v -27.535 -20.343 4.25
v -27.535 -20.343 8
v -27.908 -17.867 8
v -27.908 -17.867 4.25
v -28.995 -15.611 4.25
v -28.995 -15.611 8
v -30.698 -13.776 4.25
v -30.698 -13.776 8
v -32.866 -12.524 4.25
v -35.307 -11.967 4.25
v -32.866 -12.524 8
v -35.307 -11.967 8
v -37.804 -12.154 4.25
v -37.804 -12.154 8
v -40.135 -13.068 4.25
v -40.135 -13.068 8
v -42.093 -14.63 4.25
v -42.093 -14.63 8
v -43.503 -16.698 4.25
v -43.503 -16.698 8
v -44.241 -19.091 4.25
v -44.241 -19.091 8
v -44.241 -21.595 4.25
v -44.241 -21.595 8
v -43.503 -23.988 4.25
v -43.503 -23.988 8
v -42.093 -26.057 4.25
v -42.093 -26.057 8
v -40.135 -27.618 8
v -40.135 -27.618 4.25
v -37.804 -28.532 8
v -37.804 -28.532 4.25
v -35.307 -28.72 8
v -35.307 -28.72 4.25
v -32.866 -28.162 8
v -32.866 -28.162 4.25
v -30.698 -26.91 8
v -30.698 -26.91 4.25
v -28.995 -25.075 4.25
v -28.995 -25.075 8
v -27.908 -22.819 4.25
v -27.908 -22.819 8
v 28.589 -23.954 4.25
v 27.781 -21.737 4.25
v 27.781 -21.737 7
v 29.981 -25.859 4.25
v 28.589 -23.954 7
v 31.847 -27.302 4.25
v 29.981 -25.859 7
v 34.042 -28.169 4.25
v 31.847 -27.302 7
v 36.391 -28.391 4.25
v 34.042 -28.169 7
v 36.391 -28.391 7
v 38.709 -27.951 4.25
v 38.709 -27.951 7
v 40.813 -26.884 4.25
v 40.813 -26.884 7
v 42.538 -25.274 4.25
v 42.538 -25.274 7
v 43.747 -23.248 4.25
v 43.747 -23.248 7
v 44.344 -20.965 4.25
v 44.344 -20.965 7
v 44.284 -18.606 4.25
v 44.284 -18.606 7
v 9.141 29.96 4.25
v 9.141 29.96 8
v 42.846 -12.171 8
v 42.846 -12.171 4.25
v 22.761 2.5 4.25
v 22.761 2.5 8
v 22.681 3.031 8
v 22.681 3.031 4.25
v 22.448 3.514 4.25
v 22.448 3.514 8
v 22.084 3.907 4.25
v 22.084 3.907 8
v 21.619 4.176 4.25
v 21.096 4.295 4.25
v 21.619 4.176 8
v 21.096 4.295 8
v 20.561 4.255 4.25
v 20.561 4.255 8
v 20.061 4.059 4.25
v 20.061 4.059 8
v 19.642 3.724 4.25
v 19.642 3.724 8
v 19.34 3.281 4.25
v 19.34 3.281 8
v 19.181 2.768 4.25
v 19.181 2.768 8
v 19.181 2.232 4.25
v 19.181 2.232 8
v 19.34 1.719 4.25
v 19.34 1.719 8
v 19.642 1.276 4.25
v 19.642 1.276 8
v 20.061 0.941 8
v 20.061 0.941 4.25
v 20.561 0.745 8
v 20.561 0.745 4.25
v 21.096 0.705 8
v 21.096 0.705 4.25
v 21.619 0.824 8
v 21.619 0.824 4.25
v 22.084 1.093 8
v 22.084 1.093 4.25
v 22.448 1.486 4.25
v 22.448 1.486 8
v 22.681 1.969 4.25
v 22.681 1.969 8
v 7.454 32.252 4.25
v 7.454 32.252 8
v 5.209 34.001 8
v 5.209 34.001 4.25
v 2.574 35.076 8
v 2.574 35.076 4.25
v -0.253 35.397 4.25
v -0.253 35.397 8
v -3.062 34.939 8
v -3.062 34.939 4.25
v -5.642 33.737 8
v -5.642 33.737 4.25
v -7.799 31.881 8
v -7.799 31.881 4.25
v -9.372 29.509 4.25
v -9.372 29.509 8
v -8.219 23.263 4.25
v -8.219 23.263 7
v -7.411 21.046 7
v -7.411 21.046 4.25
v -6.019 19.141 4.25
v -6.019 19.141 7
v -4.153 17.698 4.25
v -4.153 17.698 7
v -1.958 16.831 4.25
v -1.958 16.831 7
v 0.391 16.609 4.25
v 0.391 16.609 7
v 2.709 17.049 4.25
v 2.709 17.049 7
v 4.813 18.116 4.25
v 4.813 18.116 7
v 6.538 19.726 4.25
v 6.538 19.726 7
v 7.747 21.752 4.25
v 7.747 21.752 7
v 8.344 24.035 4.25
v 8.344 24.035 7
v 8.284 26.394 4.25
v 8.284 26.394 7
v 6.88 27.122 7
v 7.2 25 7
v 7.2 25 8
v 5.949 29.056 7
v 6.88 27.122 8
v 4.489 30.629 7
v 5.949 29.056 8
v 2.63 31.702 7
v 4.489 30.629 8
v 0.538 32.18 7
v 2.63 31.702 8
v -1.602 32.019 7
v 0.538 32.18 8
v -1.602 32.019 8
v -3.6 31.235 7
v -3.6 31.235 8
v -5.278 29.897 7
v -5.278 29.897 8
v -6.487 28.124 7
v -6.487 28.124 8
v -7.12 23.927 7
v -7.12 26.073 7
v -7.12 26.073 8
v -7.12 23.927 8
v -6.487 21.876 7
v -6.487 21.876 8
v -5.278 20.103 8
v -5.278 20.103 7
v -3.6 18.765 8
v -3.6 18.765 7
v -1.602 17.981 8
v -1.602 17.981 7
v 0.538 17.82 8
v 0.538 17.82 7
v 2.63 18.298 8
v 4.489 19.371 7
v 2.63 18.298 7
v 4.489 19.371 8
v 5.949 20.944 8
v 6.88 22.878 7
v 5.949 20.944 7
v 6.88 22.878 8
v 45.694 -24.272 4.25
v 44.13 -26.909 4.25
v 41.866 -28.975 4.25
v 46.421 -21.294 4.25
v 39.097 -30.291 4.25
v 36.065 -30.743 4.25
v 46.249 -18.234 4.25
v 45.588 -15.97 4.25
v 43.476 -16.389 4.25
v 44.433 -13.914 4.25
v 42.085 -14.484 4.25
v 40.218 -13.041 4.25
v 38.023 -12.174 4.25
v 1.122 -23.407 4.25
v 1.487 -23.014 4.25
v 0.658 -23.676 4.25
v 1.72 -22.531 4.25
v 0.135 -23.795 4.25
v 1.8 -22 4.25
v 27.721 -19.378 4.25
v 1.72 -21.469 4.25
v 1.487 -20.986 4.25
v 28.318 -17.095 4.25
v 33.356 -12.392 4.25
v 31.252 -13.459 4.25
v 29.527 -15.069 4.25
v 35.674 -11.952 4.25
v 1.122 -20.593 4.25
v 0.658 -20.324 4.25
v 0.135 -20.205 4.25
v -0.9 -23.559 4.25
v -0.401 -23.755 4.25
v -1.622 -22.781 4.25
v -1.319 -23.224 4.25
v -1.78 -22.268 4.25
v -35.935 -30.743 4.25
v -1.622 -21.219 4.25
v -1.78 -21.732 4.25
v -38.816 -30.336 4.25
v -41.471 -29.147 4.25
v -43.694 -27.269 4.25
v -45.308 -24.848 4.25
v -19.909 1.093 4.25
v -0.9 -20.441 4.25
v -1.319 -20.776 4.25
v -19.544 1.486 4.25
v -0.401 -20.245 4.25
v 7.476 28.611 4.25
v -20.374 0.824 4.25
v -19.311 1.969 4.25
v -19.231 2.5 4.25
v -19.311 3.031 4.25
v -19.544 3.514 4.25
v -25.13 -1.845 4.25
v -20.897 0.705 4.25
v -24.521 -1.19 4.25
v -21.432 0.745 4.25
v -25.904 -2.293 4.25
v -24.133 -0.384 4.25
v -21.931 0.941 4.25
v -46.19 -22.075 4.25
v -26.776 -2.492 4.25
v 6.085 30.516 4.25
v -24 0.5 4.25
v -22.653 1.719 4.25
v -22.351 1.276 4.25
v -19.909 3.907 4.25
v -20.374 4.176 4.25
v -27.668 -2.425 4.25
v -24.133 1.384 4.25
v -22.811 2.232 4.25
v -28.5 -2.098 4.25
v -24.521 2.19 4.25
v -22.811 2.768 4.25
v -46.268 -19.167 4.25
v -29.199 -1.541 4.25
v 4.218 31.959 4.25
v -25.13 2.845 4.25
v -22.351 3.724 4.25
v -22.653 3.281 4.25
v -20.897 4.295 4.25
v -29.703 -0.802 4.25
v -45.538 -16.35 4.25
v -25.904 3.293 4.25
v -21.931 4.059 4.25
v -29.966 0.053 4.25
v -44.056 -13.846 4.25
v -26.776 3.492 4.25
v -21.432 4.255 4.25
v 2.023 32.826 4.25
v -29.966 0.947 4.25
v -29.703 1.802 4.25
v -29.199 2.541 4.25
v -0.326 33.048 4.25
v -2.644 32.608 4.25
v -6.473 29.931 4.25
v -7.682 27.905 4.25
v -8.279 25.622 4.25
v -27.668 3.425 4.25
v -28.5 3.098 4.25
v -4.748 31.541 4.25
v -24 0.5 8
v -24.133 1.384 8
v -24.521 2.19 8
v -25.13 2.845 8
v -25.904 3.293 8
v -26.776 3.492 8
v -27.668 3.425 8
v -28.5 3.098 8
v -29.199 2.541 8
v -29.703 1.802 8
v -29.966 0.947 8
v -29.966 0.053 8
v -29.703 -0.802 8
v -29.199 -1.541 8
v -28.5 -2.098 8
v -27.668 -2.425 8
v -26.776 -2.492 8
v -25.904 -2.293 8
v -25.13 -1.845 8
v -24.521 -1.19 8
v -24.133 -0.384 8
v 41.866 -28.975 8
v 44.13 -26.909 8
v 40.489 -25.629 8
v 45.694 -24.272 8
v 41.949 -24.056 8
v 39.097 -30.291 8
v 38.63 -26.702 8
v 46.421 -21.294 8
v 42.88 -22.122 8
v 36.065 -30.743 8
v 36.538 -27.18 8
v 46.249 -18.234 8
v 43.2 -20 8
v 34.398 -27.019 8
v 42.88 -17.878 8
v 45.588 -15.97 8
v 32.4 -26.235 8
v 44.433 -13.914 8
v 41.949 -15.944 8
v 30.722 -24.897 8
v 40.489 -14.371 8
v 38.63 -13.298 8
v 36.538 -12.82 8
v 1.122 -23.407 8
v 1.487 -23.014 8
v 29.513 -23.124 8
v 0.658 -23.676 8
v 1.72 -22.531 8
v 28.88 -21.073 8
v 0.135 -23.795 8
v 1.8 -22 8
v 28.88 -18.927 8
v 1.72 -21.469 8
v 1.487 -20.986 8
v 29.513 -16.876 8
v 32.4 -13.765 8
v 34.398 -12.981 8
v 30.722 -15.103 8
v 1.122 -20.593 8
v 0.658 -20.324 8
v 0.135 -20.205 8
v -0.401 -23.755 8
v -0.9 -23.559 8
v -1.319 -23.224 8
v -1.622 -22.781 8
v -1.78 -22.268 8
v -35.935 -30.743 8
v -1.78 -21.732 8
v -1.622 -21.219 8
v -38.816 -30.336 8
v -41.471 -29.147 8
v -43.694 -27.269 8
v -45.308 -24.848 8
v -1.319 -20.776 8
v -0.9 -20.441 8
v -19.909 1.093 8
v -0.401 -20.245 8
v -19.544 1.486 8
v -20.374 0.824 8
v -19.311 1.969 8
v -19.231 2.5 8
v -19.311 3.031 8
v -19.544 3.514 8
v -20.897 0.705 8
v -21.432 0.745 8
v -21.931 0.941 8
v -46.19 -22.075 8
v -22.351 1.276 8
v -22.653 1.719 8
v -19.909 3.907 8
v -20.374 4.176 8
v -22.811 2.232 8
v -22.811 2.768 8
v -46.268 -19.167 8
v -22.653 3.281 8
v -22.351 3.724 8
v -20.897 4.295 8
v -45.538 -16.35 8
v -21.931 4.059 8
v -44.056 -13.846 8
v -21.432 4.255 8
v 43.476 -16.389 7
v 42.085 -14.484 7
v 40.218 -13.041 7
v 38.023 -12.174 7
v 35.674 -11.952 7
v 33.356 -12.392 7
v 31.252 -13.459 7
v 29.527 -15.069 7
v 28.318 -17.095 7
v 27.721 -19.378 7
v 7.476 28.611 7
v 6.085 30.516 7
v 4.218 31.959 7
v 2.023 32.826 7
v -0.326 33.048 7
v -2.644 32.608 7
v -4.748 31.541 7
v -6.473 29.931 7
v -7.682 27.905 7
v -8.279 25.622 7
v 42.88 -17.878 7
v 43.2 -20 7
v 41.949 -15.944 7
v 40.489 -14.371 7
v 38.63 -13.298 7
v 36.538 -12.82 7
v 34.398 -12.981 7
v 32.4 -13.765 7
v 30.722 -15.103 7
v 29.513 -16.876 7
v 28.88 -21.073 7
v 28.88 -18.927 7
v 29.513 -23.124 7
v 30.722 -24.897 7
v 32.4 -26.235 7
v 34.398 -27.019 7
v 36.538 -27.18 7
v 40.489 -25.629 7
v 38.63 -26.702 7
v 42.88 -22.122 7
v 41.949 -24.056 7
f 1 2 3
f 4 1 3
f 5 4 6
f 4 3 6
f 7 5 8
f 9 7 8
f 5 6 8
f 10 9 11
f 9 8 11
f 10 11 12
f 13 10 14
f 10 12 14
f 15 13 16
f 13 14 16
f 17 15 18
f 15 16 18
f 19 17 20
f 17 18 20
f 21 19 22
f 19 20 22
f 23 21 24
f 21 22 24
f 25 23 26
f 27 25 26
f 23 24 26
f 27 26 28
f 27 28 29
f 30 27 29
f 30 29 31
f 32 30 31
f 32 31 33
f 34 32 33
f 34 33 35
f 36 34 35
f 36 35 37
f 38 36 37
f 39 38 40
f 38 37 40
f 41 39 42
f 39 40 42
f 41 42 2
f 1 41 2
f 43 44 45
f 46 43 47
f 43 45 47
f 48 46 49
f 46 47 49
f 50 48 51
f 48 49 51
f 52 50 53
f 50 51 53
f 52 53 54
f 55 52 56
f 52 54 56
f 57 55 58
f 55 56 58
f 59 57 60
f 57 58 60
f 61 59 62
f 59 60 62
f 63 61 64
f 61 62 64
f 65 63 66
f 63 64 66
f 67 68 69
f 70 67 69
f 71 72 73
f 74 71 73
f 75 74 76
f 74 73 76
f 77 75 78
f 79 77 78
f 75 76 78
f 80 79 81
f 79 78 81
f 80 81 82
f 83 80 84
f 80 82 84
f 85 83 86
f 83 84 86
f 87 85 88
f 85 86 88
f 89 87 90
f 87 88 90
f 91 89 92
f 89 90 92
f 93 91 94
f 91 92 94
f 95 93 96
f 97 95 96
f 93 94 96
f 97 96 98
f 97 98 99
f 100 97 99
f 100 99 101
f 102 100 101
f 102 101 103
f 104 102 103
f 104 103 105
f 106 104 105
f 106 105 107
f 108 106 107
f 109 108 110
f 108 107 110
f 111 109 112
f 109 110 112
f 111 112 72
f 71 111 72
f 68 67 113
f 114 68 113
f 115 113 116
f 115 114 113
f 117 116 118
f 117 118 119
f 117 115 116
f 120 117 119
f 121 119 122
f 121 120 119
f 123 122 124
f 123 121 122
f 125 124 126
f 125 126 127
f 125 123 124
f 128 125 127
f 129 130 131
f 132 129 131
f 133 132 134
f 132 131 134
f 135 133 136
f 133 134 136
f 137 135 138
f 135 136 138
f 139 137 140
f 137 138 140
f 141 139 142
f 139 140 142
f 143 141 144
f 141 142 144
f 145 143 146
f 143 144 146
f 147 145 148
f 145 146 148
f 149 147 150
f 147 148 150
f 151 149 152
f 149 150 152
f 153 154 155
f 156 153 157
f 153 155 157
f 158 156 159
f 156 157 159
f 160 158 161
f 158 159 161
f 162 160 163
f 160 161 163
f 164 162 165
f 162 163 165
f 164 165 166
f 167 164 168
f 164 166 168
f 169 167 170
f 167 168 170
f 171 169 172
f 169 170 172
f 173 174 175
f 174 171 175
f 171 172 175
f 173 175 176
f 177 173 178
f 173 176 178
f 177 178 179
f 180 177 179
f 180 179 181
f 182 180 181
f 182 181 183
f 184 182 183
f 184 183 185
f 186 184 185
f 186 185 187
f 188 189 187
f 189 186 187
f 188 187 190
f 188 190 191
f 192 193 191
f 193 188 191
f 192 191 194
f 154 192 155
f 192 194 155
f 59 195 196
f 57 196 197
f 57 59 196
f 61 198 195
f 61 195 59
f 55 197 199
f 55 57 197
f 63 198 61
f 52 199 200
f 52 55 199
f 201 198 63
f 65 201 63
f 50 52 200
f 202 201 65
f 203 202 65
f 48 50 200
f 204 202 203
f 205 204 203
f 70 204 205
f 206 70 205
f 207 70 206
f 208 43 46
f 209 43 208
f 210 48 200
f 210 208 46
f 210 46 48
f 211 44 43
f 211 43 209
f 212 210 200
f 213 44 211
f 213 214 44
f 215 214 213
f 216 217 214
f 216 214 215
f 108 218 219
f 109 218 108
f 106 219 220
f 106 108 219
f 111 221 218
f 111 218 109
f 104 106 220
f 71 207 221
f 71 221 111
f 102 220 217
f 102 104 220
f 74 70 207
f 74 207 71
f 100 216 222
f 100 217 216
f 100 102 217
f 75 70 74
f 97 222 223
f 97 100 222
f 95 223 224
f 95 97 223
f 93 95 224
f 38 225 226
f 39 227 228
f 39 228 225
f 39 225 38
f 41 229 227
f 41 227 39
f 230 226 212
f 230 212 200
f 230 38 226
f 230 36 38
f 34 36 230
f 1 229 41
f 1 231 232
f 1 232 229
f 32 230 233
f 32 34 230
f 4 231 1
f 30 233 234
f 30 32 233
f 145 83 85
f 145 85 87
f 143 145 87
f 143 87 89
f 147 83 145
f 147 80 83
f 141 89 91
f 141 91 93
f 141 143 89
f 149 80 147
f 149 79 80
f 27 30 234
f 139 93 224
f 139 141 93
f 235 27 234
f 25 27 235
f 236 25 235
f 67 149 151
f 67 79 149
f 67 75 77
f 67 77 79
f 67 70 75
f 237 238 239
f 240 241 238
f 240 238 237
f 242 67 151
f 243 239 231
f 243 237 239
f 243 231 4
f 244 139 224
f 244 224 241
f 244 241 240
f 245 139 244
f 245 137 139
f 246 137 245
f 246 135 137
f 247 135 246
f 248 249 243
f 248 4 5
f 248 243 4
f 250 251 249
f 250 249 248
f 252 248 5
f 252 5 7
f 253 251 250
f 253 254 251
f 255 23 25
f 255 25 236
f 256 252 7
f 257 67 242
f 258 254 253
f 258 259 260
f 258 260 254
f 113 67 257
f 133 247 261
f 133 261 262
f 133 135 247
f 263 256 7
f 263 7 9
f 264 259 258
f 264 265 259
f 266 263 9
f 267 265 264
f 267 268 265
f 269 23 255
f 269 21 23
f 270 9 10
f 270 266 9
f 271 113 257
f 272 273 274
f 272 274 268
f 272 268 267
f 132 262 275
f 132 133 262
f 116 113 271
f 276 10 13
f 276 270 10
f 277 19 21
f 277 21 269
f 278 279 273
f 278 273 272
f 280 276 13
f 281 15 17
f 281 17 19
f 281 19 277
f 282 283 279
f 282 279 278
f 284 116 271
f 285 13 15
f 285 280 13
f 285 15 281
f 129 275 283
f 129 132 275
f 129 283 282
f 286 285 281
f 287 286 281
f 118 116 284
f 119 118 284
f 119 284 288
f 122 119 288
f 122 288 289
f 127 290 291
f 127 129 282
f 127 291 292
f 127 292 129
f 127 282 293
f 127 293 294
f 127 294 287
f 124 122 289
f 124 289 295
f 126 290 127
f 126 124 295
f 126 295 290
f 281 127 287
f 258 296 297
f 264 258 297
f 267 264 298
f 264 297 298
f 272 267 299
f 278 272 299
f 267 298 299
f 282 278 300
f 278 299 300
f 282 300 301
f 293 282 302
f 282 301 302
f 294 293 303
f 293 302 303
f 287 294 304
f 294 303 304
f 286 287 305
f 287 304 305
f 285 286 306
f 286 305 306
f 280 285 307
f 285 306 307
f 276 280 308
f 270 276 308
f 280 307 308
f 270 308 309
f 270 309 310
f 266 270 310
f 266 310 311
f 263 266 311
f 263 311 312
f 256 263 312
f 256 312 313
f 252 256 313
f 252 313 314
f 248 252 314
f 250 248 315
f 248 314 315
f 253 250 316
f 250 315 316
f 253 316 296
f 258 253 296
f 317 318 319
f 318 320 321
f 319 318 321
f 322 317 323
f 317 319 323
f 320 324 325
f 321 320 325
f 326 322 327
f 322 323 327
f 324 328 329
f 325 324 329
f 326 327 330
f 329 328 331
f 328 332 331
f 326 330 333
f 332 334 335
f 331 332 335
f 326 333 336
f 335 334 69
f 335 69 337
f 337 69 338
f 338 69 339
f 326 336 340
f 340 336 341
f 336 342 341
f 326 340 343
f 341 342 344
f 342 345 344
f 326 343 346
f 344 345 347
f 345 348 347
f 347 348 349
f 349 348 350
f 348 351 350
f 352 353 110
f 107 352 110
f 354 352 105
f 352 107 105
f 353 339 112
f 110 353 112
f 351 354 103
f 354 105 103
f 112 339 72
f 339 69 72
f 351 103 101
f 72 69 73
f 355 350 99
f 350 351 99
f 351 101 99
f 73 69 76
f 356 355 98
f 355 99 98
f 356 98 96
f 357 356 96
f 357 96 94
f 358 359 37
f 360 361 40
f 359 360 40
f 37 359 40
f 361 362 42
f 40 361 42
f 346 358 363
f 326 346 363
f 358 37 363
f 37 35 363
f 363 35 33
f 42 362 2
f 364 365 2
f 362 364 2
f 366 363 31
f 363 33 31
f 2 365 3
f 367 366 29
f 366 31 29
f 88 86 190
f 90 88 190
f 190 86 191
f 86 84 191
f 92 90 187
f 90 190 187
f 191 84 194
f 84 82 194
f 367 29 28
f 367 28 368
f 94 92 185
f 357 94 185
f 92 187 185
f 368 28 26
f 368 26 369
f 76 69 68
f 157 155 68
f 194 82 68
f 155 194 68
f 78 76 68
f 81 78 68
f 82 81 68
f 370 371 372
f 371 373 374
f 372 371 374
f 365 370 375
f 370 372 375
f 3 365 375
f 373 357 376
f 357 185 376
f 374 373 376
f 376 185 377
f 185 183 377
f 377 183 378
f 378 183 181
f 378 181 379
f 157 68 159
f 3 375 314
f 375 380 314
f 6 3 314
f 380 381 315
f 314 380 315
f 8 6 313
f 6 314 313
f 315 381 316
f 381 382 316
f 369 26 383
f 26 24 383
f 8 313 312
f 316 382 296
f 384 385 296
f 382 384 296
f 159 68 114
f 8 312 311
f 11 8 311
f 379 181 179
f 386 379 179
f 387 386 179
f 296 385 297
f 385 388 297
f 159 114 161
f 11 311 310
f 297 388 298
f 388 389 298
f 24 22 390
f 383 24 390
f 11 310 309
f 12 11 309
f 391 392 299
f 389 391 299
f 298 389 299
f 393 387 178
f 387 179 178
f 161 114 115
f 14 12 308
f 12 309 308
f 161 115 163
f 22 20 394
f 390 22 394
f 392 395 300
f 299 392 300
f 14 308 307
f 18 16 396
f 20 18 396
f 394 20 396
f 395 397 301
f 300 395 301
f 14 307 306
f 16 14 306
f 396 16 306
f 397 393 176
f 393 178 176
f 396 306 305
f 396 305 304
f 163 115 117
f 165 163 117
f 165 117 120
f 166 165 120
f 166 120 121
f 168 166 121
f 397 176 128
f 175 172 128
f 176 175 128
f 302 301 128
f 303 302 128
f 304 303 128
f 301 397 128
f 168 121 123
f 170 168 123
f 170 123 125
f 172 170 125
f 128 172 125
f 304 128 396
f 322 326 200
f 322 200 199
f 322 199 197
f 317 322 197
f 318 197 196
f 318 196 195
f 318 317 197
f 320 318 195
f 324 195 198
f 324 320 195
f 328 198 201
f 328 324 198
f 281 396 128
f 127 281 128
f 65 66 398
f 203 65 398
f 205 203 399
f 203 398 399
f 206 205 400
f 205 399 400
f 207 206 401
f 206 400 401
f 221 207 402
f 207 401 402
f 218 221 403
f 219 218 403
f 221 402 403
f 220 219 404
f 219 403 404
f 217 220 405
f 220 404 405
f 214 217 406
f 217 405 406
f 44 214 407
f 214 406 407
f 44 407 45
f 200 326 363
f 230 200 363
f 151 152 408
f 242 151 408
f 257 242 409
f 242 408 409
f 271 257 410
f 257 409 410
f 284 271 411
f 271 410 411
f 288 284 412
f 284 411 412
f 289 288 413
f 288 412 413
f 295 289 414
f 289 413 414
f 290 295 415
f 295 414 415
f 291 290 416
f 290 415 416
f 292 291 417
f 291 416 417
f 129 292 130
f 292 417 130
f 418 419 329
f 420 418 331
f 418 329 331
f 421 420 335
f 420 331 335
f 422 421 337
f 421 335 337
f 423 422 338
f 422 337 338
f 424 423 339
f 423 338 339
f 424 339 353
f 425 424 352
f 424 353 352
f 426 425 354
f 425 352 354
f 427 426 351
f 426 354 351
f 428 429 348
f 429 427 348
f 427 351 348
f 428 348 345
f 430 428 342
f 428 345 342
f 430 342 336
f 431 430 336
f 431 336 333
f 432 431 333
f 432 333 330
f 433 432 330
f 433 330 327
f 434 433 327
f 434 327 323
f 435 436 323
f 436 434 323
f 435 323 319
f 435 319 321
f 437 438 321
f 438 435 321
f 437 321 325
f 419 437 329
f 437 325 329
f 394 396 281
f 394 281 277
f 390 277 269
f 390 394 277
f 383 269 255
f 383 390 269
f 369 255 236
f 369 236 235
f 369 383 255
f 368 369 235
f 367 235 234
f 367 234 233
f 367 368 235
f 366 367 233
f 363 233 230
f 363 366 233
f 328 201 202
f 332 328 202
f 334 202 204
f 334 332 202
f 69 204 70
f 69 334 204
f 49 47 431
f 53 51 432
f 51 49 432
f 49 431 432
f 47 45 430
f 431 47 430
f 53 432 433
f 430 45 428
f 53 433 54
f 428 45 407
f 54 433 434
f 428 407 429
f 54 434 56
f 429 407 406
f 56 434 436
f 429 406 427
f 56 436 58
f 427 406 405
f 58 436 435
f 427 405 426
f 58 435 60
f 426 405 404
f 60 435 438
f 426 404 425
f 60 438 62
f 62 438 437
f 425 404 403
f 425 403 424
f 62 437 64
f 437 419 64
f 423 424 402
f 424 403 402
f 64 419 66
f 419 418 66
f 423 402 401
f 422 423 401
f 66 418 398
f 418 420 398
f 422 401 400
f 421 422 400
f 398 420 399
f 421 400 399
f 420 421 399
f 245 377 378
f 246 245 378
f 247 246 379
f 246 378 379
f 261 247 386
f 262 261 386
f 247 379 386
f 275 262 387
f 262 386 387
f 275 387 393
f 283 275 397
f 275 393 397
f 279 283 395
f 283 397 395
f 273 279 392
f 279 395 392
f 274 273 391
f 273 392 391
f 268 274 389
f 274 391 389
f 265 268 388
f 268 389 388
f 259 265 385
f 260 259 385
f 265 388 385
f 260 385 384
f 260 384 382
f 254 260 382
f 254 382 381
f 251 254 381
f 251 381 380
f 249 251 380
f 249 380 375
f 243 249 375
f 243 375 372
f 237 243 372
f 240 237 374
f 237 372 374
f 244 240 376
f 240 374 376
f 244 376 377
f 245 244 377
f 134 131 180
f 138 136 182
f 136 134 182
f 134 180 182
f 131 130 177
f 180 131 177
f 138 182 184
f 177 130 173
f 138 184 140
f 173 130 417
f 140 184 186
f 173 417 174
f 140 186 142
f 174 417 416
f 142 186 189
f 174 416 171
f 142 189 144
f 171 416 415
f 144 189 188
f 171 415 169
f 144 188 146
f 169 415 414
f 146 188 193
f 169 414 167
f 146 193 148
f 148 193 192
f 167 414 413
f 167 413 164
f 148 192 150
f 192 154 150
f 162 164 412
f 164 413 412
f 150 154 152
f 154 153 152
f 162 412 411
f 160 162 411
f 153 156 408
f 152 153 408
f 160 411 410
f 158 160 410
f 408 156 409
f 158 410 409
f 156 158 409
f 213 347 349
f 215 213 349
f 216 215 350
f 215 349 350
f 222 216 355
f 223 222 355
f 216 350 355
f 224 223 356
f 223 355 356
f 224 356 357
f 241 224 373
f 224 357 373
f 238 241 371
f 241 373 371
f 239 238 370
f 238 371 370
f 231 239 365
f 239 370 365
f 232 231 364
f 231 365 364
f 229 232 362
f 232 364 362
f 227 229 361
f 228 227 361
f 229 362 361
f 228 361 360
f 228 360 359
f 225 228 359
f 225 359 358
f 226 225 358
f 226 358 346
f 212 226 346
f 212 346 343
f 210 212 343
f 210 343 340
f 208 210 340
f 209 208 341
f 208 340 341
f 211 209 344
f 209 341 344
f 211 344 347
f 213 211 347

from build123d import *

# Parameters (mm, degrees)
CYLINDER001_R     = 8.4
CYLINDER001_DEPTH = 5.5
CYLINDER004_R     = 7.2
CYLINDER004_DEPTH = 6.5
CYLINDER003_R     = 10.4
CYLINDER003_DEPTH = 1
CYLINDER002_R     = 10.4
CYLINDER002_DEPTH = 2.75
SKETCH_R          = 8.4
SKETCH_R_2        = 1.8
SKETCH_R_3        = 3
PAD012_DEPTH      = 3.75


with BuildPart() as bearing_holder_extract:
    # Cylinder001 → Cylinder001 (new body)
    with BuildSketch(Plane.XY):
        Circle(CYLINDER001_R)
    extrude(amount=CYLINDER001_DEPTH)


with BuildPart() as bearing_holder_extract_fusion:
    # Cylinder004 → Cylinder004 (new body)
    with BuildSketch(Plane.XY.offset(-1)):
        Circle(CYLINDER004_R)
    extrude(amount=CYLINDER004_DEPTH)

    # Fusion001: union bearing holder extract
    add(bearing_holder_extract.part)


with BuildPart() as bearing_holder_disk:
    # Cylinder003 → Cylinder003 (new body)
    with BuildSketch(Plane.XY.offset(-1)):
        Circle(CYLINDER003_R)
    extrude(amount=CYLINDER003_DEPTH)


with BuildPart() as bearing_holder_body:
    # Cylinder002 → Cylinder002 (new body)
    with BuildSketch(Plane.XY):
        Circle(CYLINDER002_R)
    extrude(amount=CYLINDER002_DEPTH)

    # Fusion002: union bearing holder disk
    add(bearing_holder_disk.part)

    # Cut003: cut bearing holder extract fusion
    add(bearing_holder_extract_fusion.part, mode=Mode.SUBTRACT)


with BuildPart() as bearing_holder_body_1:
    # Cut003 placement: moved
    add(bearing_holder_body.part.moved(Location((0, 0, 1))))


with BuildPart() as bearing_holder_body_clone003:
    # Body012 base: copy of bearing holder body
    add(bearing_holder_body_1.part)


with BuildPart() as bearing_holder_body_clone003_1:
    # Body012 placement: moved
    add(bearing_holder_body_clone003.part.moved(Location((0, 25, 0))))


with BuildPart() as base_bearing_body:
    # Sketch → Pad012 (new body)
    with BuildSketch(Plane.XY):
        with BuildLine():
            Line((-44.05596, -13.84625), (-8.05596, 31.15375))
            ThreePointArc((8.186111, 31.15375), (0.065075, 35.056922), (-8.05596, 31.15375))
            Line((8.186111, 31.15375), (44.186111, -13.84625))
            ThreePointArc((36.065075, -30.743078), (45.438629, -24.848241), (44.186111, -13.84625))
            Line((36.065075, -30.743078), (-35.934925, -30.743078))
            ThreePointArc((-44.05596, -13.84625), (-45.308478, -24.848241), (-35.934925, -30.743078))
        make_face()
        with Locations((-35.934925, -20.343078)):
            Circle(SKETCH_R, mode=Mode.SUBTRACT)
        with Locations((0.065075, 24.656922)):
            Circle(SKETCH_R, mode=Mode.SUBTRACT)
        with Locations((36.065075, -20.343078)):
            Circle(SKETCH_R, mode=Mode.SUBTRACT)
        with Locations((-21.031229, 2.5)):
            Circle(SKETCH_R_2, mode=Mode.SUBTRACT)
        with Locations((20.961264, 2.5)):
            Circle(SKETCH_R_2, mode=Mode.SUBTRACT)
        with Locations((0, -22)):
            Circle(SKETCH_R_2, mode=Mode.SUBTRACT)
        with Locations((-27, 0.5)):
            Circle(SKETCH_R_3, mode=Mode.SUBTRACT)
    extrude(amount=PAD012_DEPTH)


with BuildPart() as base_bearing_fusion:
    # Body013 base: copy of bearing holder body
    add(bearing_holder_body_1.part)


with BuildPart() as base_bearing_fusion_1:
    # Body013 placement: moved
    add(base_bearing_fusion.part.moved(Location((36, -20, 0))))

    # Fusion004: union bearing holder body clone003, base bearing body
    add(bearing_holder_body_clone003_1.part)
    add(base_bearing_body.part)


with BuildPart() as part_mirroring:
    # Part__Mirroring: instance of base bearing fusion
    add(base_bearing_fusion_1.part.mirror(Plane(origin=(0, 0, 0), x_dir=(0, 1, 0), z_dir=(0, 0, 1))))


with BuildPart() as part_mirroring_1:
    # Part__Mirroring placement: moved
    add(part_mirroring.part.moved(Location((0, 0, 8))))


solid = part_mirroring_1.part
